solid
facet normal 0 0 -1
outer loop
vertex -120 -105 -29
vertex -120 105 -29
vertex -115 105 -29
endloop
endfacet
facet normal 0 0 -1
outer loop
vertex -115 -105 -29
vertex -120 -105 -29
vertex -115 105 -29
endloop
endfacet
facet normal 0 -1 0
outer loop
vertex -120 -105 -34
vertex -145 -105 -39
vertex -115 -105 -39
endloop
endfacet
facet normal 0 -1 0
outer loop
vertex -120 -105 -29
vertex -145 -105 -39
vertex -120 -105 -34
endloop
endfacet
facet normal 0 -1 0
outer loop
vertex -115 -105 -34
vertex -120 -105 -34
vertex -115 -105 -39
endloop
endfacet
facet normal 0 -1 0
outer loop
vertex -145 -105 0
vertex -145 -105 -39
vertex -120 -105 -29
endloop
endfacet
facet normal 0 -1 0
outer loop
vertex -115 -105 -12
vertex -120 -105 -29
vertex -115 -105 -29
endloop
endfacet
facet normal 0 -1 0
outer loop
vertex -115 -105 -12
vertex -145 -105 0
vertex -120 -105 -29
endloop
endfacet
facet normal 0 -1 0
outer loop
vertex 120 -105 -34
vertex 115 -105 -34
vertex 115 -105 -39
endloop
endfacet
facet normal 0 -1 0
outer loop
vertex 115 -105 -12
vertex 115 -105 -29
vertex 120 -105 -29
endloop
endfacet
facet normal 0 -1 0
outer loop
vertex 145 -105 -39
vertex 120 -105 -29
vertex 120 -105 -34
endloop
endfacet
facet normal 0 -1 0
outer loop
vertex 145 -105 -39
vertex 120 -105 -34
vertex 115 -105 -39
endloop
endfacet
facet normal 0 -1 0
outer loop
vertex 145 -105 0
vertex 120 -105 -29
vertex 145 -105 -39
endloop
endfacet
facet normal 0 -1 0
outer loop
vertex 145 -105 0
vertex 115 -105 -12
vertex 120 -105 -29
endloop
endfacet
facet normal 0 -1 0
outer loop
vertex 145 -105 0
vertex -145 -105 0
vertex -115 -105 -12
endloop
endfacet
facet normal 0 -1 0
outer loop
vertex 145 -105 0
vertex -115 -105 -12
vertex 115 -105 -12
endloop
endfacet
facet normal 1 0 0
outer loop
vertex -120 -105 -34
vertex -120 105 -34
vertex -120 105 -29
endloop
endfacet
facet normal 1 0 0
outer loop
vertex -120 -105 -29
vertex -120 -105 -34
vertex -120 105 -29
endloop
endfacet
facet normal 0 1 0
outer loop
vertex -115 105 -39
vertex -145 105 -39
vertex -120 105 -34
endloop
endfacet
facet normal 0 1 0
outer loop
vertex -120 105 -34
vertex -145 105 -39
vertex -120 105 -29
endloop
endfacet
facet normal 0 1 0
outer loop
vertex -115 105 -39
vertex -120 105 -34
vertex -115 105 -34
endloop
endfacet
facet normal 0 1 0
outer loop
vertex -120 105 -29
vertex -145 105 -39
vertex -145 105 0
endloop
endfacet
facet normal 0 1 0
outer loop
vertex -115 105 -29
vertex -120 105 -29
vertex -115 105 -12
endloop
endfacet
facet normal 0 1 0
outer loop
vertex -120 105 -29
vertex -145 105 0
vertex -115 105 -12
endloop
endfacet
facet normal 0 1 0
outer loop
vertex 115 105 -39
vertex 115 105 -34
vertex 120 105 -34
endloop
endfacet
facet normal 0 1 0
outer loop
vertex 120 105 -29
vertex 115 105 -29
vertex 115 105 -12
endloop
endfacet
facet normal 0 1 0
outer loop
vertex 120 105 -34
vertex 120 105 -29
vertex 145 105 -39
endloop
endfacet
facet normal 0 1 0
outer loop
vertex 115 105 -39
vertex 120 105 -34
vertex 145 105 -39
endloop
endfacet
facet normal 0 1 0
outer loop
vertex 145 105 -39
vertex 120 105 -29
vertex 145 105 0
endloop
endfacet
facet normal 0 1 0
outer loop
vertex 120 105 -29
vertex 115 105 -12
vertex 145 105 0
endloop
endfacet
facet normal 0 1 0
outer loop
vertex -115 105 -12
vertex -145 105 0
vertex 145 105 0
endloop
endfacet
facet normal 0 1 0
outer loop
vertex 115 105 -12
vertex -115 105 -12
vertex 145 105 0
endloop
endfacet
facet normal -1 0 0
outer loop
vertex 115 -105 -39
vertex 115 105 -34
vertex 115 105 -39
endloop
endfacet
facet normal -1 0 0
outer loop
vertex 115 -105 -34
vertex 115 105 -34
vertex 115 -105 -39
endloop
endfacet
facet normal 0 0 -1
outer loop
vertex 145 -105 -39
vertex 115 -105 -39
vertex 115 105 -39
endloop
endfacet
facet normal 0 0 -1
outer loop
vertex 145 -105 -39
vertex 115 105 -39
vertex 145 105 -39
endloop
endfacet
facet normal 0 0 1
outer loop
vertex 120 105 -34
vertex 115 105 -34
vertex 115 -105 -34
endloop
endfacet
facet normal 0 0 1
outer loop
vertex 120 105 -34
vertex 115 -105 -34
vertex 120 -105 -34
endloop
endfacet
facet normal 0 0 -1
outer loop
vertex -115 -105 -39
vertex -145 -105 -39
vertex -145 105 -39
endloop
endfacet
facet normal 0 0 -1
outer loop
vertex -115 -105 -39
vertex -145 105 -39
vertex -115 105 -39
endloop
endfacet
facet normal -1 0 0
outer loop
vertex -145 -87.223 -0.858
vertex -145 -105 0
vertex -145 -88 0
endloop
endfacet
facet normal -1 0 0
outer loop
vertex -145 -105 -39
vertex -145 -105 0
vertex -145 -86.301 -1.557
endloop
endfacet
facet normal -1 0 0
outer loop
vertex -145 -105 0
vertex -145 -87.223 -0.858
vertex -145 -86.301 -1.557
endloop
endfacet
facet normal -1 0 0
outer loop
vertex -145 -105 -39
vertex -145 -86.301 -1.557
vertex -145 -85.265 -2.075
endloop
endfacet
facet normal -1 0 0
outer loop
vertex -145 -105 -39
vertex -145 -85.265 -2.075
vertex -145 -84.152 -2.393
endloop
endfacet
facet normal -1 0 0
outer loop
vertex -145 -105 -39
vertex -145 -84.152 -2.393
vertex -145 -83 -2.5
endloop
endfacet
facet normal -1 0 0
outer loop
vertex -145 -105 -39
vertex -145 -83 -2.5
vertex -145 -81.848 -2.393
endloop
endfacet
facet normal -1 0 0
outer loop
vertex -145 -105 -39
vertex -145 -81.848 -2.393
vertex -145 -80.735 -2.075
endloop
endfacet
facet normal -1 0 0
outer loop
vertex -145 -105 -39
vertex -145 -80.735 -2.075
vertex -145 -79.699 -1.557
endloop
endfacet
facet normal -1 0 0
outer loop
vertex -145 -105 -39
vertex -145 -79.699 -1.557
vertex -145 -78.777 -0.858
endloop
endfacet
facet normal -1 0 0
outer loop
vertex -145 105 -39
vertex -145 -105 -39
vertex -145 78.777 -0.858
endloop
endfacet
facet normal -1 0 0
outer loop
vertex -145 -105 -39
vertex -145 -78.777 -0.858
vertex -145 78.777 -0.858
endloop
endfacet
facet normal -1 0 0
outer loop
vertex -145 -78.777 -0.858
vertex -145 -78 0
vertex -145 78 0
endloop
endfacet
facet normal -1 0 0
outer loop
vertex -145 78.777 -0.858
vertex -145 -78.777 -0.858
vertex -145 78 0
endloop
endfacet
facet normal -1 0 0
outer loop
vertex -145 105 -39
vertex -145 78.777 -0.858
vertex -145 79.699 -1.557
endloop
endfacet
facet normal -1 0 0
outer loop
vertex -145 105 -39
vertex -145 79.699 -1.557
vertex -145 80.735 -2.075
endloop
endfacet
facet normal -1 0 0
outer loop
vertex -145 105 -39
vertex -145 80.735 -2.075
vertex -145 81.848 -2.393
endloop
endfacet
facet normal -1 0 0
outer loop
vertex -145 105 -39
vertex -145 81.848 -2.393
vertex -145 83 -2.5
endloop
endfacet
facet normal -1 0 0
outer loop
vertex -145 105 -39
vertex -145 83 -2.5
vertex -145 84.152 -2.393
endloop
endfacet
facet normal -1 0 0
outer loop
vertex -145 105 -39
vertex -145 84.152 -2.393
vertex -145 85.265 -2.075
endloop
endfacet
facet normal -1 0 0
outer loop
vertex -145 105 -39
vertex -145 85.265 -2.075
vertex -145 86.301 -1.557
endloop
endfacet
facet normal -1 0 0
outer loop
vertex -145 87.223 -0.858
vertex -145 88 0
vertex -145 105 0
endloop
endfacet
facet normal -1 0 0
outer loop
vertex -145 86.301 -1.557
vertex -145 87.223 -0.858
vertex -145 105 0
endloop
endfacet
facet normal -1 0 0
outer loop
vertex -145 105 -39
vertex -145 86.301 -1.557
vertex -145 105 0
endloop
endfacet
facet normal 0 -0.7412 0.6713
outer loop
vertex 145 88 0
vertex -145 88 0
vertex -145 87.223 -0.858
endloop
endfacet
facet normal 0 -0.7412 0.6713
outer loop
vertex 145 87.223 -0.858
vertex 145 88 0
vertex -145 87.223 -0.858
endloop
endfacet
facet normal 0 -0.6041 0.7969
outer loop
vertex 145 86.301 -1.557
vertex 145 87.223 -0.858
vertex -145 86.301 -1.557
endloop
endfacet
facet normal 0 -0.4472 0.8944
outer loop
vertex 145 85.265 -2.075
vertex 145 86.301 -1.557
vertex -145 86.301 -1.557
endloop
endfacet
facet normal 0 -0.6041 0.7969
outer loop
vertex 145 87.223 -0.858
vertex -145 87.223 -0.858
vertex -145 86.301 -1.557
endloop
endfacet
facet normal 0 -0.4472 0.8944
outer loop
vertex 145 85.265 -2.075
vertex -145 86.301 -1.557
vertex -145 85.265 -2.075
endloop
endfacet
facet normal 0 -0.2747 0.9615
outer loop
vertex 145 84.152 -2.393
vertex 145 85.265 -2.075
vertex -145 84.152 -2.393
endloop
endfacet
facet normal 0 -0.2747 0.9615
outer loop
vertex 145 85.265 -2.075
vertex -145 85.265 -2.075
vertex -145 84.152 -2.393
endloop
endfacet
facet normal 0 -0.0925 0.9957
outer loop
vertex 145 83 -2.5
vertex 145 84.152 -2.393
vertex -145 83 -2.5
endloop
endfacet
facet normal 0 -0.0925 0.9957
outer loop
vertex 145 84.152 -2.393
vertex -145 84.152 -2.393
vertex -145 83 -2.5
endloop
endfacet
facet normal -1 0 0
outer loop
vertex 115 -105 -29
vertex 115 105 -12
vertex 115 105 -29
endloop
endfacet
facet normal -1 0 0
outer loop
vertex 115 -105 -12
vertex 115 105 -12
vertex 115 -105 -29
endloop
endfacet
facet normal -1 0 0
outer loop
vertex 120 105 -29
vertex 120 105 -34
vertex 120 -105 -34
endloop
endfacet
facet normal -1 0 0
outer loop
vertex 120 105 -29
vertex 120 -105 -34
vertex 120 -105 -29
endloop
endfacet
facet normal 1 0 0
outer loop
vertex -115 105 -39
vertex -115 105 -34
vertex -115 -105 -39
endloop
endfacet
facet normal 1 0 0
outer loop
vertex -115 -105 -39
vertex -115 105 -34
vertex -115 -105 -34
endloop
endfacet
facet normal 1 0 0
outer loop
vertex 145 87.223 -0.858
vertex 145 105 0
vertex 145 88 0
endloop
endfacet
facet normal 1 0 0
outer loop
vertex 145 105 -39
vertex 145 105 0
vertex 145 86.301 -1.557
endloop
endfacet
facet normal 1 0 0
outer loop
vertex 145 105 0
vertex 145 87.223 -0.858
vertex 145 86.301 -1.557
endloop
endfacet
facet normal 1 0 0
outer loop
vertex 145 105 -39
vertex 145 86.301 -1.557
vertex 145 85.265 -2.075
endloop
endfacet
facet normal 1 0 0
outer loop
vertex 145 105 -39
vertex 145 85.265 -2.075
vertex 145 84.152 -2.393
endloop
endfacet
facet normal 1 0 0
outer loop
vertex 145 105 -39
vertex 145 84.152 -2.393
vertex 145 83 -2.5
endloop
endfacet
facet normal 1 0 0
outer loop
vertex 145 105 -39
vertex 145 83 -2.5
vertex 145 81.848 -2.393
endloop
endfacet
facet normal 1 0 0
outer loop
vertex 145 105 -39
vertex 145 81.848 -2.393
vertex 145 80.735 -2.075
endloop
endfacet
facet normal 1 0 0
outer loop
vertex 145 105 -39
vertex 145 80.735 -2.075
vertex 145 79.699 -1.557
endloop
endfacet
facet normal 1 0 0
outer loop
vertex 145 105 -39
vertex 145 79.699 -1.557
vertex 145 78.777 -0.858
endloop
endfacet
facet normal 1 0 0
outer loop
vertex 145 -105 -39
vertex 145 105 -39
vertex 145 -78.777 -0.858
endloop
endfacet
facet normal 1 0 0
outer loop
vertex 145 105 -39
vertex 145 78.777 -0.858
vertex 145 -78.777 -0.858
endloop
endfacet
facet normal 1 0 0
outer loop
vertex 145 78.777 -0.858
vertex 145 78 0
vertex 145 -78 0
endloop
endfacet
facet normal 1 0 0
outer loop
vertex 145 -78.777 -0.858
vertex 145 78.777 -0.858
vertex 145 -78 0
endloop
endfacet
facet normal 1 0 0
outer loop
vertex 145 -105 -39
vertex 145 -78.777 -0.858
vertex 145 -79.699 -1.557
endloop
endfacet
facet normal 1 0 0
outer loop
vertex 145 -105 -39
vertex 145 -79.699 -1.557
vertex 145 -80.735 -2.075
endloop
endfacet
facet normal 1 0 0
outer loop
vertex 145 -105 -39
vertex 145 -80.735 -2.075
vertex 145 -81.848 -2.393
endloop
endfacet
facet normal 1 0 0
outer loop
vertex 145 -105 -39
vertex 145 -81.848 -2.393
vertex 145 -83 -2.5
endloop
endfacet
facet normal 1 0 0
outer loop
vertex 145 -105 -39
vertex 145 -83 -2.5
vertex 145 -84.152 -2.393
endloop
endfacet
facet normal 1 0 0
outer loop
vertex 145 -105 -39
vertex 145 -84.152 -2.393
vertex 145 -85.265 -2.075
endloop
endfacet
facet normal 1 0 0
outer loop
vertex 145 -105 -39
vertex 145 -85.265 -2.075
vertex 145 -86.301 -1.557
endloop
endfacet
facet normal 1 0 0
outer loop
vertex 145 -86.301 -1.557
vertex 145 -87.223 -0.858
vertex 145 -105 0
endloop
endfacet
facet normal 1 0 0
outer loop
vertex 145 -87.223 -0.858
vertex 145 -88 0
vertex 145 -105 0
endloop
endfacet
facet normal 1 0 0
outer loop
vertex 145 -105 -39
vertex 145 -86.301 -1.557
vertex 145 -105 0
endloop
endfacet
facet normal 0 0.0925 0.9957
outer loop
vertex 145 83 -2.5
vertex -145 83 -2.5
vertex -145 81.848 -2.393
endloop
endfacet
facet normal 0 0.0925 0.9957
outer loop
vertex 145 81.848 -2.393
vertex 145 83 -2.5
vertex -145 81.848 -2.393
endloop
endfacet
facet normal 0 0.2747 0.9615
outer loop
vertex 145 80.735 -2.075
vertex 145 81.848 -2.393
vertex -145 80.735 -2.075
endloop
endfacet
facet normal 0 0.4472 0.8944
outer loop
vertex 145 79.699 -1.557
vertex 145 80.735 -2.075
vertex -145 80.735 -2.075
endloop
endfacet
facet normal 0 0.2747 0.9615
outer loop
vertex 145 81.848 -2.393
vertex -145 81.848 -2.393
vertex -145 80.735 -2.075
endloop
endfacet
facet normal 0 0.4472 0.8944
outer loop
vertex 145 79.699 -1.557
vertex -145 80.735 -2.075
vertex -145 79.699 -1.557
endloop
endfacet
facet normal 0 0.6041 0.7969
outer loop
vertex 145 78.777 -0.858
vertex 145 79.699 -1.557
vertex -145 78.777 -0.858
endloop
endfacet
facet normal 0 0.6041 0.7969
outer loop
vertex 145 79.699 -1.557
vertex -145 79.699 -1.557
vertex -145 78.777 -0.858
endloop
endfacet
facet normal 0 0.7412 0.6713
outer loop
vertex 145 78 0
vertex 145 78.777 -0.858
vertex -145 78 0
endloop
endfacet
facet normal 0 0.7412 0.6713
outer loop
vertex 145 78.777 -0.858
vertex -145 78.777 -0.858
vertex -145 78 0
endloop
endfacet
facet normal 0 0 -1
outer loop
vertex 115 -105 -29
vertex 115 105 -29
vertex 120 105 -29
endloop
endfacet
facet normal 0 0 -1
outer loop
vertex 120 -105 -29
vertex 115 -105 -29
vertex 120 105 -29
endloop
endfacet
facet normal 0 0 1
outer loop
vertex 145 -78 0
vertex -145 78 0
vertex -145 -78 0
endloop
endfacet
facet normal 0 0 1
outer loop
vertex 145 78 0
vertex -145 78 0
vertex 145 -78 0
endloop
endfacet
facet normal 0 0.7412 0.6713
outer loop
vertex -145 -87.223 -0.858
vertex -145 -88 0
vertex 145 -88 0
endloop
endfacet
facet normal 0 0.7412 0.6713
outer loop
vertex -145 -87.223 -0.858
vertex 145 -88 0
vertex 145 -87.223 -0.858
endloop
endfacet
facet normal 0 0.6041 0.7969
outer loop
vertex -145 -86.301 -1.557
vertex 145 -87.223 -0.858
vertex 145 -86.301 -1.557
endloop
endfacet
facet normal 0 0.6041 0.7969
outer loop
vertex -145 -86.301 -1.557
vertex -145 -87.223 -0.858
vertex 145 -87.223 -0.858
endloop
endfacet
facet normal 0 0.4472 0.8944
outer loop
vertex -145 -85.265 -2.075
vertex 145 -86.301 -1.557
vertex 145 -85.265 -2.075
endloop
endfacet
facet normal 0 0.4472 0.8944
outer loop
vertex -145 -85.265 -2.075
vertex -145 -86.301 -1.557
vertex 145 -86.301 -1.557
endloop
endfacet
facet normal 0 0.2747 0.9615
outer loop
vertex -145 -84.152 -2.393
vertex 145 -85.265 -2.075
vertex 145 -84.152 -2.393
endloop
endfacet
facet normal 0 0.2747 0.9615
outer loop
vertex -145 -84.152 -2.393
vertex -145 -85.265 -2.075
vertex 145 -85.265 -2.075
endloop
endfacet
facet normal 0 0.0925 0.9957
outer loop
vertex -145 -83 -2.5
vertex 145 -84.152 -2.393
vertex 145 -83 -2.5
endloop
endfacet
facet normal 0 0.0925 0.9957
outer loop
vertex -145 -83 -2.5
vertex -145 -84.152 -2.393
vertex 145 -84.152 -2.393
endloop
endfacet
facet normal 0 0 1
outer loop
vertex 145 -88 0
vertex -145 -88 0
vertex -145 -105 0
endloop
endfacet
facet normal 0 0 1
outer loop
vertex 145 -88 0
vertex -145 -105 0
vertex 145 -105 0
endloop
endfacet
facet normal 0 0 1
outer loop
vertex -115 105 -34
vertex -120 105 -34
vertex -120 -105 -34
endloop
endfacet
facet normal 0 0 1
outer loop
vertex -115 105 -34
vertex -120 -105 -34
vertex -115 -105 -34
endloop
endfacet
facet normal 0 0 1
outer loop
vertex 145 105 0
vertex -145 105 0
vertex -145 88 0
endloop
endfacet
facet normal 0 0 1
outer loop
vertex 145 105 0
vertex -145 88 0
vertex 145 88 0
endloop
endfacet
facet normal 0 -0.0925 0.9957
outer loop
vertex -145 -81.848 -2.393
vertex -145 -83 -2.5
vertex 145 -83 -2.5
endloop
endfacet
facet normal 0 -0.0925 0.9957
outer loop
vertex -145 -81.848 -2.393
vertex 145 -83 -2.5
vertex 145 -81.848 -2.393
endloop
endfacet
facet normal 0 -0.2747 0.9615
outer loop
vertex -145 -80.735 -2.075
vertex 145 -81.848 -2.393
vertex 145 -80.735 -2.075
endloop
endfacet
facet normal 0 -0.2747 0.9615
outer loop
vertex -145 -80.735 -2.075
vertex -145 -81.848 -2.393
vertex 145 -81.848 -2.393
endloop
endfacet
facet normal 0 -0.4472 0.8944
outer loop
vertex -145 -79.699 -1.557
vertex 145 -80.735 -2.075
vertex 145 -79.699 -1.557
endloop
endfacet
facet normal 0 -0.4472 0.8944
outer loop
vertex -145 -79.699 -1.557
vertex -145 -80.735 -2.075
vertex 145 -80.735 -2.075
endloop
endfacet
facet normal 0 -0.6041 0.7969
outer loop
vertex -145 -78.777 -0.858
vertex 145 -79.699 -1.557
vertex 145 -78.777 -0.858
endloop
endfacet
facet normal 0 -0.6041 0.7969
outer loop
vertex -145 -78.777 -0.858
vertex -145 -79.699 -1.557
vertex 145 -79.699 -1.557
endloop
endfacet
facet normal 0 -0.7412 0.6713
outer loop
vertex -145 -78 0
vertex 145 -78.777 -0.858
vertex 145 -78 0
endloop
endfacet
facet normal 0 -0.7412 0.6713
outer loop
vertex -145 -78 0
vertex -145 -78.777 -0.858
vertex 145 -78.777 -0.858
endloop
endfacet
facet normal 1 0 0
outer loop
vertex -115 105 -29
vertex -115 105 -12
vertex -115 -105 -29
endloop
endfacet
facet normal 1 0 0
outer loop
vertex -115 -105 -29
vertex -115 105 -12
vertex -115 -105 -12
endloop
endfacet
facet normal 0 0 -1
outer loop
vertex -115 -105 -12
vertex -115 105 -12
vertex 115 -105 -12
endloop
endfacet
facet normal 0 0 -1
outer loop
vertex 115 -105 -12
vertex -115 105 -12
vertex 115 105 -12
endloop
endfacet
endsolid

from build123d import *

# Parameters (mm, degrees)
F0_W     = 290
F0_H     = 210
F1_DEPTH = 12
F2_W     = 30
F2_H     = 210
F3_DEPTH = 27
F4_W     = 5
F4_H     = 5
F5_DEPTH = 210.001
F7_DEPTH = 290.001


# Not quite as in the source:
# - a pattern or mirror of a feature is missing from the dataset's text; its kind, count and spacing are read off the source's solid


with BuildPart() as f1:
    # F0 (on Top) → F1 (new body)
    with BuildSketch(Plane.XY):
        Rectangle(F0_W, F0_H)
    extrude(amount=-F1_DEPTH)

    # F2 (on face) → F3 (join)
    with BuildSketch(Plane(origin=(0, 0, -12), x_dir=(1, 0, 0), z_dir=(0, 0, -1))):
        with Locations((130, 0)):
            Rectangle(F2_W, F2_H)
        with Locations((-130, 0)):
            Rectangle(F2_W, F2_H)
    extrude(amount=F3_DEPTH)

    # F4 (on face) → F5 (cut, through all)
    with BuildSketch(Plane.XZ.offset(105)):
        with Locations((-117.5, -31.5)):
            Rectangle(F4_W, F4_H)
        with Locations((117.5, -31.5)):
            Rectangle(F4_W, F4_H)
    extrude(amount=-F5_DEPTH, mode=Mode.SUBTRACT)

    # F6 (on face) → F7 (cut, through all)
    with BuildSketch(Plane(origin=(-145, 0, 0), x_dir=(0, -1, 0), z_dir=(-1, 0, 0))):
        with BuildLine():
            Line((-78, 0), (-88, 0))
            ThreePointArc((-88, 0), (-85.7950849719, -1.8401699437), (-83, -2.5))
            ThreePointArc((-83, -2.5), (-80.2049150281, -1.8401699437), (-78, 0))
        make_face()
    f7 = extrude(amount=-F7_DEPTH, mode=Mode.SUBTRACT)

    # F7_copies: F7 across plane
    add(f7.mirror(Plane(origin=(0, 0, 0), x_dir=(0, 0, -1), z_dir=(0, -1, 0))), mode=Mode.SUBTRACT)


solid = f1.part
